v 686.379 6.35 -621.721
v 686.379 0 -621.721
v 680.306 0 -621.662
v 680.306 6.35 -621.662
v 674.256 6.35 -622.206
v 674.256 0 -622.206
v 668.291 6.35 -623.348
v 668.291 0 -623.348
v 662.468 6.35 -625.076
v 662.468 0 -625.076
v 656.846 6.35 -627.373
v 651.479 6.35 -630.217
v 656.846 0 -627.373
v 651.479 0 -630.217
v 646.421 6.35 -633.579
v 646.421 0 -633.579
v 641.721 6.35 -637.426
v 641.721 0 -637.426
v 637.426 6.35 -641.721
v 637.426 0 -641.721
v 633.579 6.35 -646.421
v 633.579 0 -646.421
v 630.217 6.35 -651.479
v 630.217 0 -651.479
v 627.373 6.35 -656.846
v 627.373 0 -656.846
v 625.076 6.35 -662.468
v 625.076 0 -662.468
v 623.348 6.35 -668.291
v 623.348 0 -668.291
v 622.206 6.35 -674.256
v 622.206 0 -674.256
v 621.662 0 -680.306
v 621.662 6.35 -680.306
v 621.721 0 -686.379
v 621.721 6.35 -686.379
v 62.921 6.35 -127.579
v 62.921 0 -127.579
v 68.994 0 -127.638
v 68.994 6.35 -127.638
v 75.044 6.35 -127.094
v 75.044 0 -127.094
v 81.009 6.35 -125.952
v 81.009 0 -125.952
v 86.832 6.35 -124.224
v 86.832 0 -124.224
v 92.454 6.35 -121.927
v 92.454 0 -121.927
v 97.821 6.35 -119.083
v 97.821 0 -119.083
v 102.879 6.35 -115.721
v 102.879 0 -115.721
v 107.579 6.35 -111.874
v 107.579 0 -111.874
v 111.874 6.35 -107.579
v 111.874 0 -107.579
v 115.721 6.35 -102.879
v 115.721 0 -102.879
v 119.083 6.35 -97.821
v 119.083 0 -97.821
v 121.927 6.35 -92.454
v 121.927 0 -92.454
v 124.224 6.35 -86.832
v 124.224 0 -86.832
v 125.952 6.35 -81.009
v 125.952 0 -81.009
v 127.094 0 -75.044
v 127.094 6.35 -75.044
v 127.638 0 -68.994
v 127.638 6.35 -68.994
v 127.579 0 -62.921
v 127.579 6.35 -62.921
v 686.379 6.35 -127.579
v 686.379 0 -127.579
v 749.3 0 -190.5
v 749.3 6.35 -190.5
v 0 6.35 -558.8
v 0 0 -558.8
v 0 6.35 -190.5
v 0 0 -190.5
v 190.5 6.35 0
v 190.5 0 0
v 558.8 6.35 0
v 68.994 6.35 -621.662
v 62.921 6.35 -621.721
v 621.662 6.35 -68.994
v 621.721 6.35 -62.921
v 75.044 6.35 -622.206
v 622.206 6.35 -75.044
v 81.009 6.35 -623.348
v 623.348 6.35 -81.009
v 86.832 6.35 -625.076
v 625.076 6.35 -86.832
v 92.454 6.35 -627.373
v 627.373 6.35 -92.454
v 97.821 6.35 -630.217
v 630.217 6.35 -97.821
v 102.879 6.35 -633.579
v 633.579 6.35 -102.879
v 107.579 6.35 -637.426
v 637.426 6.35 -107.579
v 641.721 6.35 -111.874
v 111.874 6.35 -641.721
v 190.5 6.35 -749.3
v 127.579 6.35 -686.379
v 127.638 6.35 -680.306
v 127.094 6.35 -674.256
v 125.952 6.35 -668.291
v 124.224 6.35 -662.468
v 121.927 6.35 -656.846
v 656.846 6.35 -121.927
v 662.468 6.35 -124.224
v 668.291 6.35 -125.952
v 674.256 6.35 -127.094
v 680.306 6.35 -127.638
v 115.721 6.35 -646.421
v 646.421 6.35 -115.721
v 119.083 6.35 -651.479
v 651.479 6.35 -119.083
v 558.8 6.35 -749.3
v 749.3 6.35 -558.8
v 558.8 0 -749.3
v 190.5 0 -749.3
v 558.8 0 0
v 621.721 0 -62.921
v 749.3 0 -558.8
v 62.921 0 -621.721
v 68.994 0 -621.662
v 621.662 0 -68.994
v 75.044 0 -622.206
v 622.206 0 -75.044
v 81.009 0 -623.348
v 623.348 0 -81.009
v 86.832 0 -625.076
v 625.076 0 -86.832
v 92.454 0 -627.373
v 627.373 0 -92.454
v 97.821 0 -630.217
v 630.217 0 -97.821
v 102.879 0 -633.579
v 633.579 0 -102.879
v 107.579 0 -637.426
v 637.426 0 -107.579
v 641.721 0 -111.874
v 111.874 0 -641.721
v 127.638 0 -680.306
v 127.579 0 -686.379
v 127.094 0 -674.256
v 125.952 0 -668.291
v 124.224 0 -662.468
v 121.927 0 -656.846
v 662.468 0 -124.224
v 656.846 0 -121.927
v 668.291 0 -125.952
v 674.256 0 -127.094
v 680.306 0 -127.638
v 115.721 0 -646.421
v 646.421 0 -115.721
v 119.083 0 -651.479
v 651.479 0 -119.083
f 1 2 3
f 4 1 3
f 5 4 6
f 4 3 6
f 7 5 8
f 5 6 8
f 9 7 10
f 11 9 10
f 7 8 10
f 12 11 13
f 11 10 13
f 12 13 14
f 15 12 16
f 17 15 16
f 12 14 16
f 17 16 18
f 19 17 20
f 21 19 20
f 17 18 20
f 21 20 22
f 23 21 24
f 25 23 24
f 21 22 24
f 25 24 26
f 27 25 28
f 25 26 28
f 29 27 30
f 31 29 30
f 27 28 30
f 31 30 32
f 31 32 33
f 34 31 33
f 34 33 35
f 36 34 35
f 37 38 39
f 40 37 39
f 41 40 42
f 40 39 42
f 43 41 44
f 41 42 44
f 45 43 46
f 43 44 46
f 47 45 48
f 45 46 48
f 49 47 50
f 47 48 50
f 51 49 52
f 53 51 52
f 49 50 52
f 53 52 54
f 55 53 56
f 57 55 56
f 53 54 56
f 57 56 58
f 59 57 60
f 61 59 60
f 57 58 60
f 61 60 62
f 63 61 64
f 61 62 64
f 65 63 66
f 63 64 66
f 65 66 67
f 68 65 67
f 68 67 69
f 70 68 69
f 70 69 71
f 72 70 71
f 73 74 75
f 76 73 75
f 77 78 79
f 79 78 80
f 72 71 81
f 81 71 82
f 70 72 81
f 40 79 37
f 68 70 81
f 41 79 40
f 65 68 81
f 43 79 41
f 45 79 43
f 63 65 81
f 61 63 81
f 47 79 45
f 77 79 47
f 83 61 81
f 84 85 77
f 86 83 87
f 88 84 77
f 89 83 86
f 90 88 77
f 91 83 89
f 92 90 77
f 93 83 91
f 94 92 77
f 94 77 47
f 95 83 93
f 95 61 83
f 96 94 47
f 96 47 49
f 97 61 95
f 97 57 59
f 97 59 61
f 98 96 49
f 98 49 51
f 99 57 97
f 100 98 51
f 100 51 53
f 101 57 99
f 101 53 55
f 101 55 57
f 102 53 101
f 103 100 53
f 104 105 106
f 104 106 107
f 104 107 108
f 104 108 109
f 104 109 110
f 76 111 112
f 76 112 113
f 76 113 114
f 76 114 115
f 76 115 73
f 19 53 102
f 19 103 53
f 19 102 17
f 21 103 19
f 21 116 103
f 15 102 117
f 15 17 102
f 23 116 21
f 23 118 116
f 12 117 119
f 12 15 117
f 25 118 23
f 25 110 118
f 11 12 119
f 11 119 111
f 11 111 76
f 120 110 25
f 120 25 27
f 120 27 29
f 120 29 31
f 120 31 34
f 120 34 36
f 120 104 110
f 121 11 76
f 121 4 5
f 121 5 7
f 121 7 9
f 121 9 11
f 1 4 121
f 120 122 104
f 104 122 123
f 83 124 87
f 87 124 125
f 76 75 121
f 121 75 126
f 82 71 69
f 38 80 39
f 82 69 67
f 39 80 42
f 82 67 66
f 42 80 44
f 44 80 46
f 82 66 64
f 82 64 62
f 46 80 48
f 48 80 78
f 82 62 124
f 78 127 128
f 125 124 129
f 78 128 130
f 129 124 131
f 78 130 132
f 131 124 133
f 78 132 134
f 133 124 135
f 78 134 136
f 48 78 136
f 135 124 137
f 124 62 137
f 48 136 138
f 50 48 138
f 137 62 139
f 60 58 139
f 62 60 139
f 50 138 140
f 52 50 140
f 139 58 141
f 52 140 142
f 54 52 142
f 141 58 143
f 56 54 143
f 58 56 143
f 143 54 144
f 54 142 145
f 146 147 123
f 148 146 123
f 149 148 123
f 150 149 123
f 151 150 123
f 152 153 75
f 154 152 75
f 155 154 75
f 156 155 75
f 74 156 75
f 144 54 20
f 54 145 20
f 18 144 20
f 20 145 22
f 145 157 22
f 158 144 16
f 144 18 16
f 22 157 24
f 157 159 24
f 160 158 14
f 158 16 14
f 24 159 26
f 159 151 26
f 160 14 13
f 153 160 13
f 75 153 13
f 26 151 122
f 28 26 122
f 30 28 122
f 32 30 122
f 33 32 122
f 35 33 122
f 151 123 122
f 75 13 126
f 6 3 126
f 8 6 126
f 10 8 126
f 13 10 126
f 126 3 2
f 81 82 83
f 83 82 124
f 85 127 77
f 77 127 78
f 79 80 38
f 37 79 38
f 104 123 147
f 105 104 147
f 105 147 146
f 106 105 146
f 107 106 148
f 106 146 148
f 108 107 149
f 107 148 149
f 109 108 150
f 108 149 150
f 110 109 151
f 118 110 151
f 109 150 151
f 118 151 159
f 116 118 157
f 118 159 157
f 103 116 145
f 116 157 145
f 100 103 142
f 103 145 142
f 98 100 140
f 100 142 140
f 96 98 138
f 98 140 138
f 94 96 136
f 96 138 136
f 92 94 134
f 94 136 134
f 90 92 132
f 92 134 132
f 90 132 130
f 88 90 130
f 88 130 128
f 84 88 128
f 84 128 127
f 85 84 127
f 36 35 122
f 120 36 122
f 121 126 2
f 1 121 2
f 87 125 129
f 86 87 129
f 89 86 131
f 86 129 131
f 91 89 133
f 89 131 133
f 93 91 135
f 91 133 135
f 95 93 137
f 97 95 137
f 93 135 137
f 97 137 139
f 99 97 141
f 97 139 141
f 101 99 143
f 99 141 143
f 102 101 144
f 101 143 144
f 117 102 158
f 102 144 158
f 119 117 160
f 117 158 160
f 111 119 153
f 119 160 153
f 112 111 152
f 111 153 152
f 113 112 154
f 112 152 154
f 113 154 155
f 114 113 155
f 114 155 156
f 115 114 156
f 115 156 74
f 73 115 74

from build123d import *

# Parameters (mm, degrees)
BOSS_EXTRUDE1_DEPTH = 6.35


with BuildPart() as part:
    # Sketch1 → Boss-Extrude1 (new body)
    with BuildSketch(Plane(origin=(0, 0, 0), x_dir=(1, 0, 0), z_dir=(0, 1, 0))):
        with BuildLine():
            Line((127.578922036, 62.921077964), (190.5, 0))
            Line((190.5, 0), (558.8, 0))
            Line((558.8, 0), (621.721077964, 62.921077964))
            ThreePointArc((621.721077964, 62.921077964), (639.520218393, 109.779781607), (686.378922036, 127.578922036))
            Line((686.378922036, 127.578922036), (749.3, 190.5))
            Line((749.3, 190.5), (749.3, 558.8))
            Line((749.3, 558.8), (686.378922036, 621.721077964))
            ThreePointArc((686.378922036, 621.721077964), (639.520218393, 639.520218393), (621.721077964, 686.378922036))
            Line((621.721077964, 686.378922036), (558.8, 749.3))
            Line((558.8, 749.3), (190.5, 749.3))
            Line((190.5, 749.3), (127.578922036, 686.378922036))
            ThreePointArc((127.578922036, 686.378922036), (109.779781607, 639.520218393), (62.921077964, 621.721077964))
            Line((62.921077964, 621.721077964), (0, 558.8))
            Line((0, 558.8), (0, 190.5))
            Line((0, 190.5), (62.921077964, 127.578922036))
            ThreePointArc((62.921077964, 127.578922036), (109.779781607, 109.779781607), (127.578922036, 62.921077964))
        make_face()
    extrude(amount=BOSS_EXTRUDE1_DEPTH)


solid = part.part
